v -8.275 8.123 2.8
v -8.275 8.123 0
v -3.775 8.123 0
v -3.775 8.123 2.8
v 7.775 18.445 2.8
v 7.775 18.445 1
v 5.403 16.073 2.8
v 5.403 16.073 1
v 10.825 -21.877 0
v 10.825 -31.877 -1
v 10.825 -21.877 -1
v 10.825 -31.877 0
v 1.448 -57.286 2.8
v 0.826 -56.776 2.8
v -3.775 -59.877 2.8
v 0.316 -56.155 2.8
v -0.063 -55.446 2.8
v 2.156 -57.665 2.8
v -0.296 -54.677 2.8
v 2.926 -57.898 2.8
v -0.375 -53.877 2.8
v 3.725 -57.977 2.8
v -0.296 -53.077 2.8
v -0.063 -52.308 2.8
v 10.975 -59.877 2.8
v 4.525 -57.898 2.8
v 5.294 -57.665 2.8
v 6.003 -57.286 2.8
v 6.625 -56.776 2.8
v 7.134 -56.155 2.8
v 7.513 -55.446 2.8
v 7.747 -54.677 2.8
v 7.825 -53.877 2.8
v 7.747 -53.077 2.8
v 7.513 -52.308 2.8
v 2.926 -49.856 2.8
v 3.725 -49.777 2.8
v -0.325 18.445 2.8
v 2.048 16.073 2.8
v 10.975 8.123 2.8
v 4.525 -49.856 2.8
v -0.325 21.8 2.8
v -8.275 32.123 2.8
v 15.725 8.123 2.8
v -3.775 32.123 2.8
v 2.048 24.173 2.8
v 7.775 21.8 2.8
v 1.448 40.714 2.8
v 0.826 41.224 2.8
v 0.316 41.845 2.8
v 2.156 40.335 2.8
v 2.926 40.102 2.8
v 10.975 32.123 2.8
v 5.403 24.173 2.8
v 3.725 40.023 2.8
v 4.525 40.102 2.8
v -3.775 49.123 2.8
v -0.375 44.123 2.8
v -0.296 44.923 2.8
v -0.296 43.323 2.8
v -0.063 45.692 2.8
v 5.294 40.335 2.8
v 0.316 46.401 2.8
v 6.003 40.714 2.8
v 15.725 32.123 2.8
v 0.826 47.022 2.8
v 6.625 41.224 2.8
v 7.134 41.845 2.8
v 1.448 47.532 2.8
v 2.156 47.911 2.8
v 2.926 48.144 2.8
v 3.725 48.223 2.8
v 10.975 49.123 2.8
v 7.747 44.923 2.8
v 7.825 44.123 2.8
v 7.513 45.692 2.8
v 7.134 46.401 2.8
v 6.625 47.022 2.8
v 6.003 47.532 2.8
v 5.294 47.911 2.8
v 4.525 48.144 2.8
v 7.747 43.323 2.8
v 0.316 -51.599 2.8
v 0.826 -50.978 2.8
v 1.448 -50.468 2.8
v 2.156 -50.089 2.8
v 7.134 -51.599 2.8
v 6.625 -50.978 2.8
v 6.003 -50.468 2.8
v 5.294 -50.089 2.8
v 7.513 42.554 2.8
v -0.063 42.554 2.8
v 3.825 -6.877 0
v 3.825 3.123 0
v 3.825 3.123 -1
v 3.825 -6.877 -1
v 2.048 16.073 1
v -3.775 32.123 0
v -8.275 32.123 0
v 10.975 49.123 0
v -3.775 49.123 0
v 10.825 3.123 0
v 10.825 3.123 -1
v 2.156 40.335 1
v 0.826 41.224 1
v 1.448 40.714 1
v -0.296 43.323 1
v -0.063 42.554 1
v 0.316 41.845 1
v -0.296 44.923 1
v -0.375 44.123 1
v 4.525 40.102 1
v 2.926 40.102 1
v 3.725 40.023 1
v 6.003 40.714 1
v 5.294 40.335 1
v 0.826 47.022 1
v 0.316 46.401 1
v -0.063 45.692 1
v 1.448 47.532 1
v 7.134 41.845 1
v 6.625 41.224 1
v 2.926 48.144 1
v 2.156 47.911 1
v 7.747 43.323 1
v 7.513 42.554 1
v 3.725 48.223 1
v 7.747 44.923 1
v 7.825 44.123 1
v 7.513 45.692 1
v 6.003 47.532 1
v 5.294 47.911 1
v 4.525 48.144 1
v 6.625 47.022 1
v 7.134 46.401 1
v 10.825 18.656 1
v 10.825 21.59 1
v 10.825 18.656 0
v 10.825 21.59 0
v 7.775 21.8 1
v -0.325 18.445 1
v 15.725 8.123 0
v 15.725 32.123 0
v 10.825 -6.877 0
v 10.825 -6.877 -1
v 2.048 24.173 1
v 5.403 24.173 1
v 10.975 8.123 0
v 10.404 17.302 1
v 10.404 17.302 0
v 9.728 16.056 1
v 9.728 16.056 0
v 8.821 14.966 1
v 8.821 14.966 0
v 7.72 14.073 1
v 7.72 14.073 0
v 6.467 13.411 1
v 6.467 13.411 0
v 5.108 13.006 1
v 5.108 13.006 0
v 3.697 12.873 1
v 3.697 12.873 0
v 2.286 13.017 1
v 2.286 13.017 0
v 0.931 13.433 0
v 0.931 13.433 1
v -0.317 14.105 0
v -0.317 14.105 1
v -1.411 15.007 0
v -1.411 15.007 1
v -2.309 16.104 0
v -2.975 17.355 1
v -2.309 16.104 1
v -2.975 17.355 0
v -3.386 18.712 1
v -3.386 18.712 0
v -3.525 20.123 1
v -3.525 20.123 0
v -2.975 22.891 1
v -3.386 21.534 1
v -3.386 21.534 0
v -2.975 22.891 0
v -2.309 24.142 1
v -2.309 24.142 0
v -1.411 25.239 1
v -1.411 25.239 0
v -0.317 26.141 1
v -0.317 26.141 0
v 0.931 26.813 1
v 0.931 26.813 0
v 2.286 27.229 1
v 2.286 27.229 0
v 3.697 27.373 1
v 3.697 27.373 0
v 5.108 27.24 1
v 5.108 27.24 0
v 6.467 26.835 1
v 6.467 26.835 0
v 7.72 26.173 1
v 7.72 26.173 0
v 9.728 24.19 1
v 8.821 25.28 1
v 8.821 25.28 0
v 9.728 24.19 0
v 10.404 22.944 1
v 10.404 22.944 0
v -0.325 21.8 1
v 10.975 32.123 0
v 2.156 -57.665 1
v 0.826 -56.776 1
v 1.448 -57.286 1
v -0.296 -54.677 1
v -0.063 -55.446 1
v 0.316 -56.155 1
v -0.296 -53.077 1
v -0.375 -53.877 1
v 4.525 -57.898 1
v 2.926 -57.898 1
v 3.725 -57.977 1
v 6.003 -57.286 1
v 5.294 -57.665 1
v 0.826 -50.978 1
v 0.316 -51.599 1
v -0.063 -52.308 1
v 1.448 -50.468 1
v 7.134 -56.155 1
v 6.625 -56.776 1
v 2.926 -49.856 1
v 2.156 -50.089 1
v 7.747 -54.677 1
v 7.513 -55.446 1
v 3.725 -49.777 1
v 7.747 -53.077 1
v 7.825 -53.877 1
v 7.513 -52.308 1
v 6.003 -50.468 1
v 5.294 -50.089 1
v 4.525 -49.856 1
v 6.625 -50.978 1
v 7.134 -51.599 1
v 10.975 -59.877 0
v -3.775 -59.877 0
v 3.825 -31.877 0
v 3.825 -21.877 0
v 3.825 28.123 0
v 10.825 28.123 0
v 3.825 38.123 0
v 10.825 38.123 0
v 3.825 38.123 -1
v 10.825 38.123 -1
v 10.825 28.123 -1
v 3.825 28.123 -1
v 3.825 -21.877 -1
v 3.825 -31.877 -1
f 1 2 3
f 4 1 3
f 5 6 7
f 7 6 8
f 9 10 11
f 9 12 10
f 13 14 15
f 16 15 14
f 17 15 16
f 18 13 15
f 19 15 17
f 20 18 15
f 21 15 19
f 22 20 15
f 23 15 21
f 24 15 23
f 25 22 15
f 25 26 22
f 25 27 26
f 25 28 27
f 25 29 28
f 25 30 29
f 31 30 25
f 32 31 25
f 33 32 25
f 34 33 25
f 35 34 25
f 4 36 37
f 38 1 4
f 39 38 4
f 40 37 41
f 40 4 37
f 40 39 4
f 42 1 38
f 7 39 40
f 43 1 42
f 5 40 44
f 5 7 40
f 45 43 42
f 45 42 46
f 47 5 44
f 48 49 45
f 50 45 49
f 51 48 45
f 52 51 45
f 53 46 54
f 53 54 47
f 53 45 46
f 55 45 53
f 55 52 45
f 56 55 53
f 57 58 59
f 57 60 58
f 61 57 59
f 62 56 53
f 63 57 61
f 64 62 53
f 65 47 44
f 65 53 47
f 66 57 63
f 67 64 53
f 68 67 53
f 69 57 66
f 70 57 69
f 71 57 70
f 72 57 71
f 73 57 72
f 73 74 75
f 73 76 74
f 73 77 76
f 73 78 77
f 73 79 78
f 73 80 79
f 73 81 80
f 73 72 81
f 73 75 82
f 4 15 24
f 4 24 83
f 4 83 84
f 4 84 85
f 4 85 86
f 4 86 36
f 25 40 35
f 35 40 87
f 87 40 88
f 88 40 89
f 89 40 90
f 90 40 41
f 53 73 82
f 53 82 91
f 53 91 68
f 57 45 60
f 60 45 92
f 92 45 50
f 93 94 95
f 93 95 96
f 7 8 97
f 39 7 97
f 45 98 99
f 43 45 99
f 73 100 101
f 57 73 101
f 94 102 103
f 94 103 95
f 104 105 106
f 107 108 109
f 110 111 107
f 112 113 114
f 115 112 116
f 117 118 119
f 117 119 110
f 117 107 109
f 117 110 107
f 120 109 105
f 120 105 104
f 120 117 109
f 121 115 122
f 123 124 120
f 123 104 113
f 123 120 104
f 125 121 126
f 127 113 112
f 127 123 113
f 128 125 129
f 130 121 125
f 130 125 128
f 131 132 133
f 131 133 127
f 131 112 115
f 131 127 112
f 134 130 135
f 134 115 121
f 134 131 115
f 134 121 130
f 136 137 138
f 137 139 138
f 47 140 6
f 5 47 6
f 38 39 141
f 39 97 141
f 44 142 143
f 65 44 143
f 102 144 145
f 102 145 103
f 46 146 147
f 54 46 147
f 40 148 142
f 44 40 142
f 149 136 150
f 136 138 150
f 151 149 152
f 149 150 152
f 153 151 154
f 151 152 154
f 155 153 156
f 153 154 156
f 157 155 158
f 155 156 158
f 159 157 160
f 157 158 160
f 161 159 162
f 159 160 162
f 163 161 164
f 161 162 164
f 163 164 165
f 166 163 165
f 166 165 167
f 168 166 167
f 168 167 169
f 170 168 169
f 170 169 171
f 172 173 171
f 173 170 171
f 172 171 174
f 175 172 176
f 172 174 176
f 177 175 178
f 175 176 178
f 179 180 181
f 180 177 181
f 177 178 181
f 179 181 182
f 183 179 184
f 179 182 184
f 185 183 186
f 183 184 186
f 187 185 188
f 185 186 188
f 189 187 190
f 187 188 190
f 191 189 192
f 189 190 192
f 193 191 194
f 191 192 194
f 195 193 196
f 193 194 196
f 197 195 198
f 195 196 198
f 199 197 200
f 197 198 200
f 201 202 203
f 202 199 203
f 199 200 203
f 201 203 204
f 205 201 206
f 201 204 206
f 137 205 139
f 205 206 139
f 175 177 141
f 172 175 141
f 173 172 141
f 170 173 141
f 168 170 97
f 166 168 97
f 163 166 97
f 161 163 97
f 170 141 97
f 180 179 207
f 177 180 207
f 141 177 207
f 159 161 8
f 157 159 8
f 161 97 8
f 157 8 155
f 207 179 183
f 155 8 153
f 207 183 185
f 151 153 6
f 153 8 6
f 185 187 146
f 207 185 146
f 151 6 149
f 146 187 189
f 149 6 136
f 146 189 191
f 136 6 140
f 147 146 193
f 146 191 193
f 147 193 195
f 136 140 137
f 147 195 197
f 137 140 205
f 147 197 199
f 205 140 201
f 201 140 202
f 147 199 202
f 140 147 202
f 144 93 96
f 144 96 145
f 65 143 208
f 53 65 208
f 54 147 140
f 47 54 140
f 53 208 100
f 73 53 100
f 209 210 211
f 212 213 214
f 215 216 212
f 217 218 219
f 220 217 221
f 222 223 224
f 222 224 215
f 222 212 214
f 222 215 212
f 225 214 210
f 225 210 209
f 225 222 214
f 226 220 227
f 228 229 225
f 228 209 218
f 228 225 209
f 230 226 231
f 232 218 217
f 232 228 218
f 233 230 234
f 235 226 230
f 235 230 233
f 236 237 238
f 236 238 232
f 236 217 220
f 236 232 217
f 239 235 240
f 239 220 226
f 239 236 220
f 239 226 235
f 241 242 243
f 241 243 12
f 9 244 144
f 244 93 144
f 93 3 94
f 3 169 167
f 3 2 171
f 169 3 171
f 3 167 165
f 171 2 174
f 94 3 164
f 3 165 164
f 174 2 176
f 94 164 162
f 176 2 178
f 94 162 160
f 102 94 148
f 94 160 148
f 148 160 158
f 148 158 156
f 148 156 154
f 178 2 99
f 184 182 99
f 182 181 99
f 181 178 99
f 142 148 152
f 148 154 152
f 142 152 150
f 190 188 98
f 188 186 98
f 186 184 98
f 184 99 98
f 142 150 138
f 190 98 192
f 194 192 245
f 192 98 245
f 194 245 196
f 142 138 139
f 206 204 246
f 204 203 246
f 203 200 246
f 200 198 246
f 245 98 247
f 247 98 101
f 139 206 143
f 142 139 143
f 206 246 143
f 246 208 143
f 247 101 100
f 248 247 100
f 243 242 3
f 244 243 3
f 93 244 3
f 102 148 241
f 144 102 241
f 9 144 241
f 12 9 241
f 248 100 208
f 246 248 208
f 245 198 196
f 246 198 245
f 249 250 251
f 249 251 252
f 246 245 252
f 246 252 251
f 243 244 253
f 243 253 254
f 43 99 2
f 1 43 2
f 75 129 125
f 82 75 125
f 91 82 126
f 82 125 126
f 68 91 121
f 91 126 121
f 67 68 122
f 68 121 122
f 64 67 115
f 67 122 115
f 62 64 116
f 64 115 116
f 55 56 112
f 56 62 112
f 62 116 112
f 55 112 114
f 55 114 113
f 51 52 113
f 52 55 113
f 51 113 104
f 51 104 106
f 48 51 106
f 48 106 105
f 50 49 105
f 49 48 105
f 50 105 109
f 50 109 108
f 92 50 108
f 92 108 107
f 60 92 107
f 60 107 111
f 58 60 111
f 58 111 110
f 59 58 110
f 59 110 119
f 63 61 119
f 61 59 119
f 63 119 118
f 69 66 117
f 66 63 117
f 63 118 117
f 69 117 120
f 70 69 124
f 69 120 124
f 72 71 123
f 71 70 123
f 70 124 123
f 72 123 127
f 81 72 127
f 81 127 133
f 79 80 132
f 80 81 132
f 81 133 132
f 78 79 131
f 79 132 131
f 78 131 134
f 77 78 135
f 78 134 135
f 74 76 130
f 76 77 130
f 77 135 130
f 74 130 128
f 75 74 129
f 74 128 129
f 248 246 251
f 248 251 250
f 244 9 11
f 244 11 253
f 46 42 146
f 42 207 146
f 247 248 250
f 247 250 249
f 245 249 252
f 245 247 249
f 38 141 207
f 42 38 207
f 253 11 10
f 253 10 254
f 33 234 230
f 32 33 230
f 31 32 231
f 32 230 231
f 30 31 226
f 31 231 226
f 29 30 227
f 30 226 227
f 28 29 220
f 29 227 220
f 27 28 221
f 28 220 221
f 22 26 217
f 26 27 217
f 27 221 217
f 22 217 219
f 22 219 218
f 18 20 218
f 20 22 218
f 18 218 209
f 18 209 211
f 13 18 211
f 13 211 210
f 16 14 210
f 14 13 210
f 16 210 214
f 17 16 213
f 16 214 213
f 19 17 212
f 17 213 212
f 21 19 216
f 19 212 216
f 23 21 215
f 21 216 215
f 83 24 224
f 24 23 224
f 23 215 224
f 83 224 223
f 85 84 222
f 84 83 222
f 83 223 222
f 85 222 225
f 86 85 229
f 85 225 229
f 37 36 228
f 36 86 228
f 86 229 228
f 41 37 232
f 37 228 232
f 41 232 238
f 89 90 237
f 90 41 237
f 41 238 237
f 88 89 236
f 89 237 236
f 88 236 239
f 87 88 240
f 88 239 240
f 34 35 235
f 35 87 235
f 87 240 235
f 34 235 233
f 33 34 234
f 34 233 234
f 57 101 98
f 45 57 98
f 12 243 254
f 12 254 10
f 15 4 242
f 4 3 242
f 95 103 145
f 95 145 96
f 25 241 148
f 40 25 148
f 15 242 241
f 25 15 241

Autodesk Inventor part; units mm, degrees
ref_plane "YZ Plane" through (0, 0, 0) normal (1, 0, 0) x (0, 1, 0)
ref_plane "XZ Plane" through (0, 0, 0) normal (0, 1, 0) x (-1, 0, 0)
ref_plane "XY Plane" through (0, 0, 0) normal (0, 0, 1) x (1, 0, 0)
ref_plane "Arbeitsebene1" through (0, 0, 0) normal (0, 0, 1) x (1, 0, 0)
sketch "Skizze1" plane through (0, 0, 0) normal (0, 0, 1) x (1, 0, 0)
  circle A0 centre (-26.7746, 32.123) radius 1.5 construction
  circle A1 centre (15.7254, 11.123) radius 1.5 construction
  circle A2 centre (-26.2746, -24.877) radius 1.5 construction
  circle A3 centre (12.7254, -26.877) radius 1.5 construction
  circle A4 centre (12.7254, 30.123) radius 1.5 construction
  line L0 (11.0254, 3.323) -> (11.0254, -7.077) construction
  line L1 (11.0254, -7.077) -> (3.6254, -7.077) construction
  line L2 (3.6254, -7.077) -> (3.6254, 3.323) construction
  line L3 (3.6254, 3.323) -> (11.0254, 3.323) construction
  line L4 (3.6254, -32.077) -> (3.6254, -21.677) construction
  line L5 (3.6254, -21.677) -> (11.0254, -21.677) construction
  line L6 (11.0254, -21.677) -> (11.0254, -32.077) construction
  line L7 (11.0254, -32.077) -> (3.6254, -32.077) construction
  line L8 (11.0254, 27.923) -> (3.6254, 27.923) construction
  line L9 (3.6254, 27.923) -> (3.6254, 38.323) construction
  line L10 (3.6254, 38.323) -> (11.0254, 38.323) construction
  line L11 (11.0254, 38.323) -> (11.0254, 27.923) construction
  line L12 (-28.2746, 30.123) -> (-28.2746, -34.877) construction
  line L13 (-28.2746, -34.877) -> (-3.7746, -34.877) construction
  line L14 (-3.7746, -34.877) -> (-3.7746, -59.877) construction
  line L15 (-3.7746, -59.877) -> (10.8254, -59.877) construction
  line L16 (10.8254, -59.877) -> (10.8254, -34.877) construction
  line L17 (10.8254, -34.877) -> (20.2254, -34.877) construction
  line L18 (20.2254, -34.877) -> (20.2254, 39.123) construction
  line L19 (20.2254, 39.123) -> (10.8254, 39.123) construction
  line L20 (10.8254, 39.123) -> (10.8254, 49.123) construction
  line L21 (10.8254, 49.123) -> (-3.7746, 49.123) construction
  line L22 (-3.7746, 49.123) -> (-3.7746, 39.123) construction
  line L23 (-3.7746, 39.123) -> (-29.2746, 39.123) construction
  line L24 (-29.2746, 39.123) -> (-29.2746, 30.123) construction
  line L25 (-29.2746, 30.123) -> (-28.2746, 30.123) construction
  circle A5 centre (3.7254, 20.123) radius 7.5 construction
  line L26 (-3.7746, 49.123) -> (10.8254, 49.123) construction
  line L27 (10.8254, 49.123) -> (10.8254, -59.877) construction
  line L28 (10.8254, -59.877) -> (-3.7746, -59.877) construction
  line L29 (-3.7746, -59.877) -> (-3.7746, 49.123) construction
  line L30 (-3.7746, 49.123) -> (10.8254, 49.123)
  line L31 (10.8254, 49.123) -> (10.8254, -59.877)
  line L32 (10.8254, -59.877) -> (-3.7746, -59.877)
  line L33 (-3.7746, -59.877) -> (-3.7746, 49.123)
  circle A6 centre (3.7254, 44.123) radius 4.1 projected
  circle A7 centre (3.7254, -53.877) radius 4.1 projected
  line L34 (-8.2746, 32.123) -> (15.7254, 32.123)
  line L35 (15.7254, 32.123) -> (15.7254, 8.123)
  line L36 (15.7254, 8.123) -> (-8.2746, 8.123)
  line L37 (-8.2746, 8.123) -> (-8.2746, 32.123)
  line L38 (-8.2746, 32.123) -> (15.7254, 8.123) construction
  line L39 (15.7254, 32.123) -> (-8.2746, 8.123) construction
  circle A8 centre (3.7254, 20.123) radius 7.5
  circle A9 centre (3.7254, 20.123) radius 7.25
  line L40 (10.8254, 49.123) -> (10.9754, 49.123)
  line L41 (10.9754, 49.123) -> (10.9754, -59.877)
  line L42 (10.9754, -59.877) -> (10.8254, -59.877)
  line L43 (10.8254, -59.877) -> (10.8254, 49.123)
  point P0 (0, 0)
  dimension "d0" = 24
  dimension "d1" = 24
  dimension "d2" = 14.5
  dimension "d5" = 0.15
extrude "Extrusion1" add sketch "Skizze1" along normal blind 1 contours L30 L31 L34 L33 | L40 L41 L34 L31 | L34 L31 A8 L33 | L33 L36 L37 L34 | L34 L41 A8 L31 | A8 L31 L36 L33 | A8 L31 A9 | A8 L41 A9 L31 | L34 L35 L36 L41 A8 | L36 L31 L32 L33 | A8 L41 L36 L31 | L31 A9 L41 A8 | A9 L31 | A8 L41 | L36 L41 L42 L31 | A6 | A7 picked at (10.8531, 19.7957)
sketch "Skizze2" plane through (0, 0, 0) normal (0, 0, -1) x (-1, 0, 0)
  circle A0 centre (26.7746, 32.123) radius 1.5 projected
  circle A1 centre (-15.7254, 11.123) radius 1.5 projected
  circle A2 centre (26.2746, -24.877) radius 1.5 projected
  circle A3 centre (-12.7254, -26.877) radius 1.5 projected
  circle A4 centre (-12.7254, 30.123) radius 1.5 projected
  line L0 (-11.0254, 3.323) -> (-11.0254, -7.077) projected
  line L1 (-11.0254, -7.077) -> (-3.6254, -7.077) projected
  line L2 (-3.6254, -7.077) -> (-3.6254, 3.323) projected
  line L3 (-3.6254, 3.323) -> (-11.0254, 3.323) projected
  line L4 (-3.6254, -32.077) -> (-3.6254, -21.677) projected
  line L5 (-3.6254, -21.677) -> (-11.0254, -21.677) projected
  line L6 (-11.0254, -21.677) -> (-11.0254, -32.077) projected
  line L7 (-11.0254, -32.077) -> (-3.6254, -32.077) projected
  line L8 (-11.0254, 27.923) -> (-3.6254, 27.923) projected
  line L9 (-3.6254, 27.923) -> (-3.6254, 38.323) projected
  line L10 (-3.6254, 38.323) -> (-11.0254, 38.323) projected
  line L11 (-11.0254, 38.323) -> (-11.0254, 27.923) projected
  line L12 (28.2746, 30.123) -> (28.2746, -34.877) projected
  line L13 (28.2746, -34.877) -> (3.7746, -34.877) projected
  line L14 (3.7746, -34.877) -> (3.7746, -59.877) projected
  line L15 (3.7746, -59.877) -> (-10.8254, -59.877) projected
  line L16 (-10.8254, -59.877) -> (-10.8254, -34.877) projected
  line L17 (-10.8254, -34.877) -> (-20.2254, -34.877) projected
  line L18 (-20.2254, -34.877) -> (-20.2254, 39.123) projected
  line L19 (-20.2254, 39.123) -> (-10.8254, 39.123) projected
  line L20 (-10.8254, 39.123) -> (-10.8254, 49.123) projected
  line L21 (-10.8254, 49.123) -> (3.7746, 49.123) projected
  line L22 (3.7746, 49.123) -> (3.7746, 39.123) projected
  line L23 (3.7746, 39.123) -> (29.2746, 39.123) projected
  line L24 (29.2746, 39.123) -> (29.2746, 30.123) projected
  line L25 (29.2746, 30.123) -> (28.2746, 30.123) projected
  circle A5 centre (-3.7254, 20.123) radius 7.5 projected
  line L26 (-3.8254, 38.123) -> (-3.8254, 28.123)
  line L27 (-3.8254, 28.123) -> (-10.8254, 28.123)
  line L28 (-10.8254, 28.123) -> (-10.8254, 38.123)
  line L29 (-10.8254, 38.123) -> (-3.8254, 38.123)
  line L30 (-3.8254, 3.123) -> (-3.8254, -6.877)
  line L31 (-3.8254, -6.877) -> (-10.8254, -6.877)
  line L32 (-10.8254, -6.877) -> (-10.8254, 3.123)
  line L33 (-10.8254, 3.123) -> (-3.8254, 3.123)
  line L34 (-10.8254, -21.877) -> (-3.8254, -21.877)
  line L35 (-3.8254, -21.877) -> (-3.8254, -31.877)
  line L36 (-3.8254, -31.877) -> (-10.8254, -31.877)
  line L37 (-10.8254, -31.877) -> (-10.8254, -21.877)
  point P0 (0, 0)
  dimension "d7" = 0.2
  dimension "d8" = 0.2
  dimension "d9" = 0.2
extrude "Extrusion2" add sketch "Skizze2" along normal blind 1 contours L26 L27 L28 L29 | L30 L31 L32 L33 | L34 L35 L36 L37
sketch "Skizze3" plane through (0, 0, 1) normal (0, 0, 1) x (1, 0, 0)
  circle A0 centre (3.7254, 20.123) radius 3.5 construction
  arc A1 (-0.3746, 17.023) -> (0.6254, 16.023) centre (0.6254, 17.023) ccw construction
  line L0 (0.6254, 16.023) -> (6.8254, 16.023) construction
  arc A2 (6.8254, 16.023) -> (7.8254, 17.023) centre (6.8254, 17.023) ccw construction
  line L1 (7.8254, 17.023) -> (7.8254, 18.7249) construction
  line L2 (7.8254, 18.7249) -> (9.8254, 18.7249) construction
  line L3 (9.8254, 19.2249) -> (9.8254, 18.7249) construction
  line L4 (7.8254, 19.2249) -> (9.8254, 19.2249) construction
  line L5 (7.8254, 19.2249) -> (7.8254, 21.021) construction
  line L6 (7.8254, 21.021) -> (9.8254, 21.021) construction
  line L7 (9.8254, 21.521) -> (9.8254, 21.021) construction
  line L8 (7.8254, 21.521) -> (9.8254, 21.521) construction
  line L9 (7.8254, 21.521) -> (7.8254, 23.223) construction
  arc A3 (7.8254, 23.223) -> (6.8254, 24.223) centre (6.8254, 23.223) ccw construction
  line L10 (6.8254, 24.223) -> (0.6254, 24.223) construction
  arc A4 (0.6254, 24.223) -> (-0.3746, 23.223) centre (0.6254, 23.223) ccw construction
  line L11 (-0.3746, 23.223) -> (-0.3746, 17.023) construction
  line L12 (10.9754, 49.123) -> (-3.7746, 49.123) projected
  line L13 (-3.7746, 49.123) -> (-3.7746, 32.123) projected
  line L14 (-3.7746, 32.123) -> (-8.2746, 32.123) projected
  line L15 (-8.2746, 32.123) -> (-8.2746, 8.123) projected
  line L16 (-8.2746, 8.123) -> (-3.7746, 8.123) projected
  line L17 (-3.7746, 8.123) -> (-3.7746, -59.877) projected
  line L18 (-3.7746, -59.877) -> (10.9754, -59.877) projected
  line L19 (10.9754, -59.877) -> (10.9754, 8.123) projected
  line L20 (10.9754, 8.123) -> (15.7254, 8.123) projected
  line L21 (15.7254, 8.123) -> (15.7254, 32.123) projected
  line L22 (15.7254, 32.123) -> (10.9754, 32.123) projected
  line L23 (10.9754, 32.123) -> (10.9754, 49.123) projected
  circle A5 centre (3.7254, 44.123) radius 4.1 projected
  circle A6 centre (3.7254, -53.877) radius 4.1 projected
  line L24 (-0.3246, 18.4454) -> (-0.3246, 21.8005)
  line L25 (-0.3246, 21.8005) -> (2.0478, 24.173)
  line L26 (2.0478, 24.173) -> (5.403, 24.173)
  line L27 (5.403, 24.173) -> (7.7754, 21.8005)
  line L28 (7.7754, 21.8005) -> (7.7754, 18.4454)
  line L29 (7.7754, 18.4454) -> (5.403, 16.073)
  line L30 (5.403, 16.073) -> (2.0478, 16.073)
  line L31 (2.0478, 16.073) -> (-0.3246, 18.4454)
  line L32 (-8.2746, 32.123) -> (-8.2746, 8.123) projected
  point P0 (0, 0)
  dimension "d16" = 8.1
extrude "Extrusion3" add sketch "Skizze3" along normal blind 1.8
properties part number "02_Lensadapter"
